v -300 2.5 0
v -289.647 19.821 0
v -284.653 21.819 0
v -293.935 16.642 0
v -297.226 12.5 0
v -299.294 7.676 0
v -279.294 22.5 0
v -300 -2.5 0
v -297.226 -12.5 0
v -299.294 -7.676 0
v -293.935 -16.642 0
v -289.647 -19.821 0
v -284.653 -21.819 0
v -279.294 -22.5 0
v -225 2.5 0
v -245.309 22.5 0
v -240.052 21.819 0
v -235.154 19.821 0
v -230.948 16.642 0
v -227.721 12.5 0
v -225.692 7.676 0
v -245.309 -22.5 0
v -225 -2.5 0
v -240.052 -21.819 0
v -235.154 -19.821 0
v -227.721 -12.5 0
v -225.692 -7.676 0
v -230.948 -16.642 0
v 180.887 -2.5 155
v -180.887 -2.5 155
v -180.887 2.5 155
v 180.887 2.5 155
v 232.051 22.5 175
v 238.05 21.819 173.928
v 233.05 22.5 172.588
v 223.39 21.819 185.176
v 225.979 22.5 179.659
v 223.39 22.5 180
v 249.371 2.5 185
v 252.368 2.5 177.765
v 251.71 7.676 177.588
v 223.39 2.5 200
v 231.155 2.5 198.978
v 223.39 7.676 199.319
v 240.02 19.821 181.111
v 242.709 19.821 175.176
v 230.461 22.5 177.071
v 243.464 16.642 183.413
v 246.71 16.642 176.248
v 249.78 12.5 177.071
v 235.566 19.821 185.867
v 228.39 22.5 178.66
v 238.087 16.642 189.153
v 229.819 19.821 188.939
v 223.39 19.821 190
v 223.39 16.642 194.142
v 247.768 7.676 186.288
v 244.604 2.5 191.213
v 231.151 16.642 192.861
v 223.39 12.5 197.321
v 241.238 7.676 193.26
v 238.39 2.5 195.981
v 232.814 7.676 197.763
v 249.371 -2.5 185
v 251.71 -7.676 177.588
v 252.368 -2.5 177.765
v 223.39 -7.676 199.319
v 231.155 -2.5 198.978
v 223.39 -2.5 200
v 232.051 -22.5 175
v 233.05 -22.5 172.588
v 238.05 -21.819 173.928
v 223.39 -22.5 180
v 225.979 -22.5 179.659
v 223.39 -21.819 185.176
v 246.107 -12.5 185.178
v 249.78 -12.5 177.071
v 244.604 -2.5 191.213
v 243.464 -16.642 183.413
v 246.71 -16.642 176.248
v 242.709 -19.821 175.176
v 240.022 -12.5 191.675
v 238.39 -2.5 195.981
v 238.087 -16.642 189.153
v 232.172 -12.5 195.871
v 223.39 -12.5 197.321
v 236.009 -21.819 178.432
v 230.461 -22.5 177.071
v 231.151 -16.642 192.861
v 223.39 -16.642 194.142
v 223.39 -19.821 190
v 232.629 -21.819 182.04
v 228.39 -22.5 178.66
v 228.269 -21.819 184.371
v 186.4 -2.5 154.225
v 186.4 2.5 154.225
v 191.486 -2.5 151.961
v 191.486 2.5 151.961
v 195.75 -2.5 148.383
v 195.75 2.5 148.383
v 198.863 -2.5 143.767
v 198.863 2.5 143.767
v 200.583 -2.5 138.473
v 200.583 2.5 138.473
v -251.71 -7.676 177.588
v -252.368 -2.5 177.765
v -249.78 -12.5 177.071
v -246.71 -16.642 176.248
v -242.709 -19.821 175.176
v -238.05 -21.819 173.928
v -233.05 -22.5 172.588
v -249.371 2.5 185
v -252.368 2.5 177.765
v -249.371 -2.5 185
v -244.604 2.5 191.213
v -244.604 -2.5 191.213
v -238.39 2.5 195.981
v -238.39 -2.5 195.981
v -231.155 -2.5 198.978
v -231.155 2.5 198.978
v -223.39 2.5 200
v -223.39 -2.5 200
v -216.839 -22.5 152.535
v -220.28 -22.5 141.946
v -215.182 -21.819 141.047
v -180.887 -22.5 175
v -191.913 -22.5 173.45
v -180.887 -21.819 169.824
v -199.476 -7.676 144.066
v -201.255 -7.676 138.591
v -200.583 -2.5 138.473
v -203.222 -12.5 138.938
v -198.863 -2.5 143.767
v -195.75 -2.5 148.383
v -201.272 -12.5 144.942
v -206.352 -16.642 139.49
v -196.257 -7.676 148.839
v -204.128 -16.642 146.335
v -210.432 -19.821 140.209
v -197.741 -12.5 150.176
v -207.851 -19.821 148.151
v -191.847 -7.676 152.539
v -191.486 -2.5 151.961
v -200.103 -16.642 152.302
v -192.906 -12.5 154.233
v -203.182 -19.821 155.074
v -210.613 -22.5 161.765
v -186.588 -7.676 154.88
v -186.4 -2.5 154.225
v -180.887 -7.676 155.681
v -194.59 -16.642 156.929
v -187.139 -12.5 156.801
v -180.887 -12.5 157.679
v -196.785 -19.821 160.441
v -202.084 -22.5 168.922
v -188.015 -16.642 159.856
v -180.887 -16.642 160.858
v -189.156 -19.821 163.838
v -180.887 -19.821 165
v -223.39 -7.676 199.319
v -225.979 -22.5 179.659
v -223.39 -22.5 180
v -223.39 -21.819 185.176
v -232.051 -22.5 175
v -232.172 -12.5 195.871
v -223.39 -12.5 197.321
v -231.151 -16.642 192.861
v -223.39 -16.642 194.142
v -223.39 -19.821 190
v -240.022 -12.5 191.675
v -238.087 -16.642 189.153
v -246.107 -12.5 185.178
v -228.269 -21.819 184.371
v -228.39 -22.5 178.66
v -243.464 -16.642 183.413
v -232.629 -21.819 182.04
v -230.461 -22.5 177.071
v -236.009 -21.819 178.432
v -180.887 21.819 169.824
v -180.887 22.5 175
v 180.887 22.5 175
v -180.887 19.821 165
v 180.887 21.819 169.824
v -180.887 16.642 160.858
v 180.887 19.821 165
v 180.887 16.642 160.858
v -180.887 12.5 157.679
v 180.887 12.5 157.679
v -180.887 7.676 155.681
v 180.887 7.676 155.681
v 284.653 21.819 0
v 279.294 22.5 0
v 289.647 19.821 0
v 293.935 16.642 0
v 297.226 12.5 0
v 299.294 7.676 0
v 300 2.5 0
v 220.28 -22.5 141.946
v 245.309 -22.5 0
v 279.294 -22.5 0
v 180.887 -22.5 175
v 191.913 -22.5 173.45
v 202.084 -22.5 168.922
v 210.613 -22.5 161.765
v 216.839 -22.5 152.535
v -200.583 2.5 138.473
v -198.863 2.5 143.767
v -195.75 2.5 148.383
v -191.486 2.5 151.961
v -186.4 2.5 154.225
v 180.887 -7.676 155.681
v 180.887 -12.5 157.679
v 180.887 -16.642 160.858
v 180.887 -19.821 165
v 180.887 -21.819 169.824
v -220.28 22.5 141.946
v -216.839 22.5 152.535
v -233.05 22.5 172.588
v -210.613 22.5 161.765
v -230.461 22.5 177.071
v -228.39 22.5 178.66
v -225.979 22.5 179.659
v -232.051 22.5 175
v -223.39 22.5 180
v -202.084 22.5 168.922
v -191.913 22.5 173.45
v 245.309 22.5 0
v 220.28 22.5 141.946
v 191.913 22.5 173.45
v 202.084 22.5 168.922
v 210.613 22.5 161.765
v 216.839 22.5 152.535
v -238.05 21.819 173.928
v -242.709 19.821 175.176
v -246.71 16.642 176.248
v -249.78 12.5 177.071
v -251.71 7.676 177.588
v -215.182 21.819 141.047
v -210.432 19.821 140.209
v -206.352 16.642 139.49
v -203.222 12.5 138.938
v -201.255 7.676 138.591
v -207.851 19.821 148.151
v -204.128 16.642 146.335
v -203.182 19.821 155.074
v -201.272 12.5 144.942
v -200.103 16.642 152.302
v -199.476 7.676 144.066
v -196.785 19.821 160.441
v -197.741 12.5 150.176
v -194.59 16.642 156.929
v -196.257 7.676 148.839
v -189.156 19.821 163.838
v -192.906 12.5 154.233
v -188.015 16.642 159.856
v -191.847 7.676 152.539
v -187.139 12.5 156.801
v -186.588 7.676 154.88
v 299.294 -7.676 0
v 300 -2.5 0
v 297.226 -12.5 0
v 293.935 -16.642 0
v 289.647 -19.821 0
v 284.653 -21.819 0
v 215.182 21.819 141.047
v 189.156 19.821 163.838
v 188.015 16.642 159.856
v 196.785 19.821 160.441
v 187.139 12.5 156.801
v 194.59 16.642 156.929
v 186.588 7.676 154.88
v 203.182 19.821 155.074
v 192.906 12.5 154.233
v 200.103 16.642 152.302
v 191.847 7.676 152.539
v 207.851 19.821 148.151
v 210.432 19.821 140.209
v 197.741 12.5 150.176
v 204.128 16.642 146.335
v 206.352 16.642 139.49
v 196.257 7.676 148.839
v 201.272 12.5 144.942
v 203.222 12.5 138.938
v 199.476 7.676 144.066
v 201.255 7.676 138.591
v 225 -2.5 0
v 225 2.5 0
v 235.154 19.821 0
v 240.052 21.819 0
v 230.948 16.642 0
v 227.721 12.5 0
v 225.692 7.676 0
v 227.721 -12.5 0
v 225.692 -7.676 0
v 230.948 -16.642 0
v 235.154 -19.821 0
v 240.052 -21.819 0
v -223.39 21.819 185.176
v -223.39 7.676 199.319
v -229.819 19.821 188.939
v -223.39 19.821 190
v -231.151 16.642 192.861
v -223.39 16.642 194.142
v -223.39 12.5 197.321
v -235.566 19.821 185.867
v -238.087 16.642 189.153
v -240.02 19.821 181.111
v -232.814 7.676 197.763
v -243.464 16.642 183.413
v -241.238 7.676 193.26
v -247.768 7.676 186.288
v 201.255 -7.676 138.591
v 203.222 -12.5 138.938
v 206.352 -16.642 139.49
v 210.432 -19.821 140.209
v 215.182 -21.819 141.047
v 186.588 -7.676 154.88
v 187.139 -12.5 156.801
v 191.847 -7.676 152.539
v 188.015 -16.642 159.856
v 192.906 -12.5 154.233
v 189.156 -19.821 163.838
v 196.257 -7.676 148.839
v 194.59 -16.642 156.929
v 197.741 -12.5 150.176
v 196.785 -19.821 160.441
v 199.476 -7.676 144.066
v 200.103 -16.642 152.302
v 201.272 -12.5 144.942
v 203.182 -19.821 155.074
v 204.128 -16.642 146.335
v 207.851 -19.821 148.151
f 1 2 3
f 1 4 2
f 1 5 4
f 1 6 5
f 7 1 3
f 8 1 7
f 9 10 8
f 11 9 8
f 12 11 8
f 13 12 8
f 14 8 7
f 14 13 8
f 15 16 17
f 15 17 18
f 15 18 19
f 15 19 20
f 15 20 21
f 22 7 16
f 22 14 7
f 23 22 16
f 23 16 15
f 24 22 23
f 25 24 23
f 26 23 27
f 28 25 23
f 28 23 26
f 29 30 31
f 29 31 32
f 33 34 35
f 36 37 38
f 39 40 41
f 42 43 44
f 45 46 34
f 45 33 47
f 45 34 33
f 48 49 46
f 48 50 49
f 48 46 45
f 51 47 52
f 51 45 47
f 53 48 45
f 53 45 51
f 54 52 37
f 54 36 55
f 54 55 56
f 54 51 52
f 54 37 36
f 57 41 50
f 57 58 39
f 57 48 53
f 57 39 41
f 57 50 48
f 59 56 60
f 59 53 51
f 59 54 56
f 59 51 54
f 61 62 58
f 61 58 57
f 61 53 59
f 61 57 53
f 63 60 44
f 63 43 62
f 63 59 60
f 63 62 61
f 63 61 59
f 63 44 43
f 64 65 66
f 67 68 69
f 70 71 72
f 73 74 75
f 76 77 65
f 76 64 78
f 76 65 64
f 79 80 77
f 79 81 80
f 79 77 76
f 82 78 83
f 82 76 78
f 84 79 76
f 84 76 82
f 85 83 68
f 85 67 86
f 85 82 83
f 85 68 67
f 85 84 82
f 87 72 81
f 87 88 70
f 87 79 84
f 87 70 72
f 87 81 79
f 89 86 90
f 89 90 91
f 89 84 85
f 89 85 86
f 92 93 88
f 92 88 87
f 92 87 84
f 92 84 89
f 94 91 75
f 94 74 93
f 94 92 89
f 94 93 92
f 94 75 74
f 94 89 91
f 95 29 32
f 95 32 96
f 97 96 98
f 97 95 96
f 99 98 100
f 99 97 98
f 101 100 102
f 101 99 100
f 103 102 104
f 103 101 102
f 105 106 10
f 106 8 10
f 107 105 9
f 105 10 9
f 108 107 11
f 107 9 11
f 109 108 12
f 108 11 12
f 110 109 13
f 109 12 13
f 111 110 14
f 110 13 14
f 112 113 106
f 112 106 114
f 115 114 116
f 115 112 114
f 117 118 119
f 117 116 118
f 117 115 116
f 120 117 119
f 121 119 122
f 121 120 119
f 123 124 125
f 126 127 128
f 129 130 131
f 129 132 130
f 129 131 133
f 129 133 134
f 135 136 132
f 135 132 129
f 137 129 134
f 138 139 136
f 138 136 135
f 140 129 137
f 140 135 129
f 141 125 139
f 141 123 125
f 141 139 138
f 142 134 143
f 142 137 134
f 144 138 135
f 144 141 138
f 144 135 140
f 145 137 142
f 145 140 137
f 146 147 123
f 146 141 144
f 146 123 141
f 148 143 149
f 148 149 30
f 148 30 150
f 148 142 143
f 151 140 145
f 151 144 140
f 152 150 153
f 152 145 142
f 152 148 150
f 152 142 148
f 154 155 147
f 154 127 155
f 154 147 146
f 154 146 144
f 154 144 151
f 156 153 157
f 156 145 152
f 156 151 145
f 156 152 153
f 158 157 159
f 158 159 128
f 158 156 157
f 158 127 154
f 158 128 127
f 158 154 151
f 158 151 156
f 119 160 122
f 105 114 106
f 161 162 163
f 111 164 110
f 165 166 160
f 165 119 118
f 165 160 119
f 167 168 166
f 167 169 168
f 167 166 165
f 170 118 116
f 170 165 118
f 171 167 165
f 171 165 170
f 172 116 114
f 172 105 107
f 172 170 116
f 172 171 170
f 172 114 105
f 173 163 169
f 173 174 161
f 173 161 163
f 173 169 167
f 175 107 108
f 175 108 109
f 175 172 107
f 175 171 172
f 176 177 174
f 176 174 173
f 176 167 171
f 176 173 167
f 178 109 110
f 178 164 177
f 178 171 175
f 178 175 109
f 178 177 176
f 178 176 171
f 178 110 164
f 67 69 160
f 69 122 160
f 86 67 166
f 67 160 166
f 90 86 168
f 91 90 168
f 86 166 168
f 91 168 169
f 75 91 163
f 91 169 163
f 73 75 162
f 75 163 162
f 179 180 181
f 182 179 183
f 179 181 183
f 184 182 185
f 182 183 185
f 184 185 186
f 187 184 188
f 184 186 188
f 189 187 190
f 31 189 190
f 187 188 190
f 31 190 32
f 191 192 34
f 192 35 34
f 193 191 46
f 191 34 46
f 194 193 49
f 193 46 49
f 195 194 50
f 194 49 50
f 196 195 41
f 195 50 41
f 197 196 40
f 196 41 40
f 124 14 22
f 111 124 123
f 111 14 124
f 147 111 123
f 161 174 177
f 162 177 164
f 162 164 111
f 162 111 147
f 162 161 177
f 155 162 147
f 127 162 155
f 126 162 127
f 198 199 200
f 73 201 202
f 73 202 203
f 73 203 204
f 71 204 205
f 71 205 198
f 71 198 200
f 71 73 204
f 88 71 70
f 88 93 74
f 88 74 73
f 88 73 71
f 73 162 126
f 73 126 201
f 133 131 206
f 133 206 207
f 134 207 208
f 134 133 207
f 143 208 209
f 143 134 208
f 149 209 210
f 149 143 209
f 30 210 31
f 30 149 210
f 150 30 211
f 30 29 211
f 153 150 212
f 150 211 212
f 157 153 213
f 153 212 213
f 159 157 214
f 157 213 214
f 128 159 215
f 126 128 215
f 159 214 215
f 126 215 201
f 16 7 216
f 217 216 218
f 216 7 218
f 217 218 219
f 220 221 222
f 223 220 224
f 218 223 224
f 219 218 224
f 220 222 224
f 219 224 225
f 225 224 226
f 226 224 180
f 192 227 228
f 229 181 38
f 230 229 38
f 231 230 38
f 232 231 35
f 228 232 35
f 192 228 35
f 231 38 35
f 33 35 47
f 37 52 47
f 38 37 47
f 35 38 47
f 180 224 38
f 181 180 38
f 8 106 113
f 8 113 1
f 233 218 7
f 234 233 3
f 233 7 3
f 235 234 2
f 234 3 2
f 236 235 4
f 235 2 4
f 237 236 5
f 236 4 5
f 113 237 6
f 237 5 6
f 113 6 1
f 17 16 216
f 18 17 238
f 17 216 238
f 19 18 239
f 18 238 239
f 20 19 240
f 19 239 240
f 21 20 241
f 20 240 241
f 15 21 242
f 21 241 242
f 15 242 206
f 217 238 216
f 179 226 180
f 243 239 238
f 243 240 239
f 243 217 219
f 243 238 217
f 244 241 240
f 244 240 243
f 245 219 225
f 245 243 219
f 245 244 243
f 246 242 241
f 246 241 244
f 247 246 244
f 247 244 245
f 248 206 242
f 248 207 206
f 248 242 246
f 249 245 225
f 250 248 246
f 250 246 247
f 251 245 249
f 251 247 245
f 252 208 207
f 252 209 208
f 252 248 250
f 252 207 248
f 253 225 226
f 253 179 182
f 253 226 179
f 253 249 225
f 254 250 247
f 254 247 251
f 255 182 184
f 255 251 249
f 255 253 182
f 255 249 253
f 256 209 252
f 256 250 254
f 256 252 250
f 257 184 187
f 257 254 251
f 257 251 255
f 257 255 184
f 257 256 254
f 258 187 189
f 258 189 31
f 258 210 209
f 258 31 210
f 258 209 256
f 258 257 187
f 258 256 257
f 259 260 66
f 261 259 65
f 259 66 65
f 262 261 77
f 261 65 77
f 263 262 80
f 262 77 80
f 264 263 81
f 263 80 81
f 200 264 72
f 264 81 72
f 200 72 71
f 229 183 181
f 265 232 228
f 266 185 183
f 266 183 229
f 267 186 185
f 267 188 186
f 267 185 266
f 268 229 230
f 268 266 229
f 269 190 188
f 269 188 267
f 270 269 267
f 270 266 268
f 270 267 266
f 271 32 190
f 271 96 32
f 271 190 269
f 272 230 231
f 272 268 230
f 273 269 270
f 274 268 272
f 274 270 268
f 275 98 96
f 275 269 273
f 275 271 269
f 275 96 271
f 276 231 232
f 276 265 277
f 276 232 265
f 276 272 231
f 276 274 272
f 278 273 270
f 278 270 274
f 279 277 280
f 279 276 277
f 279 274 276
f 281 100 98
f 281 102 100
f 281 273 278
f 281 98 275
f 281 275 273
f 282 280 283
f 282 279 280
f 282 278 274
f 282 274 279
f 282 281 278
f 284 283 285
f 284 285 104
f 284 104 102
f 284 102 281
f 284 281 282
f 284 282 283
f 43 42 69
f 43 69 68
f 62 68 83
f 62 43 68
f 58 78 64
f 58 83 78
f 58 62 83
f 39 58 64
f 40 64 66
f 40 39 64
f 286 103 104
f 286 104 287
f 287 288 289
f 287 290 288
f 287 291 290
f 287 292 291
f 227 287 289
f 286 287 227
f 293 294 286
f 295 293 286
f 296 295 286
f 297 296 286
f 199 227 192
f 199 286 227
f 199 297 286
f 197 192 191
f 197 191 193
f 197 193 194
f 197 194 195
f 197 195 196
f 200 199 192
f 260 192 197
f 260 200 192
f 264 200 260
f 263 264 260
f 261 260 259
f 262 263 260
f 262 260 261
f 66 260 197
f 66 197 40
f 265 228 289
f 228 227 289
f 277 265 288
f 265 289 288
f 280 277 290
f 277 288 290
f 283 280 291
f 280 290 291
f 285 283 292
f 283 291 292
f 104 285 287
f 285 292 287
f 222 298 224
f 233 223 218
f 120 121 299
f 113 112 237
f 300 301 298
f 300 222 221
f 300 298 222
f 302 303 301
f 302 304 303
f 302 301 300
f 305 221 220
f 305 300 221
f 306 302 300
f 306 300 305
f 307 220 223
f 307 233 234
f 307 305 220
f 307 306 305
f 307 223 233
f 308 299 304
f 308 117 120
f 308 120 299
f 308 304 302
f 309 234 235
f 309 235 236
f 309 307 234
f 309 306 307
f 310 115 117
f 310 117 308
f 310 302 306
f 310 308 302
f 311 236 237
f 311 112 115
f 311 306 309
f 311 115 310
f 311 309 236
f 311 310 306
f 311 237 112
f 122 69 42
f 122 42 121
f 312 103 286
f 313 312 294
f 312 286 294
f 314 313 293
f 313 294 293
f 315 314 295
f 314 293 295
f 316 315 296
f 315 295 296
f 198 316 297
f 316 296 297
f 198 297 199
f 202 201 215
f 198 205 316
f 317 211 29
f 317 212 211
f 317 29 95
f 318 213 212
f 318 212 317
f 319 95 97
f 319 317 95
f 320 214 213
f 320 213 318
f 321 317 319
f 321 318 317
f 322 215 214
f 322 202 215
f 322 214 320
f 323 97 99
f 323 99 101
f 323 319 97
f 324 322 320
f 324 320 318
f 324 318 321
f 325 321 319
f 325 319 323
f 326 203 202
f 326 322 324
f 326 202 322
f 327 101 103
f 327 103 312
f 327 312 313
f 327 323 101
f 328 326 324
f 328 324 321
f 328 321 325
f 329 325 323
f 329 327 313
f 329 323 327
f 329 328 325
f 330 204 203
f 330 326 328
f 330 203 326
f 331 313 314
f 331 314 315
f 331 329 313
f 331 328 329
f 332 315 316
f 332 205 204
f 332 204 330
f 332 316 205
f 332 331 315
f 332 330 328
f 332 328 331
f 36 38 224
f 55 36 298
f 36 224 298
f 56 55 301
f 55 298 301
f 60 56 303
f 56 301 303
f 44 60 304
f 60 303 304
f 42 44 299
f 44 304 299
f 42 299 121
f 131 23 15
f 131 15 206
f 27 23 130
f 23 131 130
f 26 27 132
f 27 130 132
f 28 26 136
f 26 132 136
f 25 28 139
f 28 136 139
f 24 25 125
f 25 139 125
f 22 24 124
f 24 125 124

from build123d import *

# Parameters (mm, degrees)
F1_DEPTH = 22.5
F2_R     = 30
F3_R     = 20
F4_R     = 20


with BuildPart() as f1:
    # F0 (on Front) → F1 (new body, symmetric)
    with BuildSketch(Plane.XZ):
        Polygon((-246.410162, 200), (-300, 0), (-225, 0), (-197.669318, 155), (197.669318, 155), (225, 0), (300, 0), (246.410162, 200), align=None)
    extrude(amount=F1_DEPTH, both=True)

    # F2
    f2_edges = [f1.edges().sort_by_distance(p)[0] for p in [
        (246.410162, 0, 200),
        (-246.410162, 0, 200),
    ]]
    fillet(f2_edges, radius=F2_R)

    # F3
    f3_edges = [f1.edges().sort_by_distance(p)[0] for p in [
        (-197.669318, 0, 155),
        (197.669318, 0, 155),
    ]]
    fillet(f3_edges, radius=F3_R)

    # F4
    f4_edges = [f1.edges().sort_by_distance(p)[0] for p in [
        (0, 22.5, 200),
        (0, 22.5, 155),
        (212.79174, -22.5, 69.236482),
        (276.184063, -22.5, 88.882286),
    ]]
    fillet(f4_edges, radius=F4_R)


solid = f1.part
